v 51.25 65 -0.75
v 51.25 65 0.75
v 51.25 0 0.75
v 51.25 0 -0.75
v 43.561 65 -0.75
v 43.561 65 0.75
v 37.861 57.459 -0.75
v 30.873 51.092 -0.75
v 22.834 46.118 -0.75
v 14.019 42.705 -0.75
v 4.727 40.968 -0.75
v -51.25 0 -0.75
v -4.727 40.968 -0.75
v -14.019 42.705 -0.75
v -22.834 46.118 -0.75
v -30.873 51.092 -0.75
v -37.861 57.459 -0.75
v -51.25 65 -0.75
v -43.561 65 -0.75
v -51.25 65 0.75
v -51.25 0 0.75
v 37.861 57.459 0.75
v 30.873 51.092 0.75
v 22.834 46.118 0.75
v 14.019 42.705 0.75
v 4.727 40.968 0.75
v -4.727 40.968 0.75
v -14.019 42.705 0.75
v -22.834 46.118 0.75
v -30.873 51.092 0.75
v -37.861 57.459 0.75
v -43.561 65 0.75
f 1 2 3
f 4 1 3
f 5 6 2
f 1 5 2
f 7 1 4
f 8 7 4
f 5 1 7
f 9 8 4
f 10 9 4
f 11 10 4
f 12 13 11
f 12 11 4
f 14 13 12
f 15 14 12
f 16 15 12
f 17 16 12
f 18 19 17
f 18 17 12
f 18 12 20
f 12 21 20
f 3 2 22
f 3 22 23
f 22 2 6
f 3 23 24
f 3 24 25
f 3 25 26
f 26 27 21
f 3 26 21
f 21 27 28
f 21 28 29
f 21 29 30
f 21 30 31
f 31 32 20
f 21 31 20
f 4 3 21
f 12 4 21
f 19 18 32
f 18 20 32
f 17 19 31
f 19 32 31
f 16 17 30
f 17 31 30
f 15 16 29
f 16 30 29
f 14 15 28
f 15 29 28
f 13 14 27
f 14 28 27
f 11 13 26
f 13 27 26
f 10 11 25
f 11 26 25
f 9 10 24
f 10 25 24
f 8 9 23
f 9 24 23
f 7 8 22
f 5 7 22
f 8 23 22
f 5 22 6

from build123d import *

# Parameters (mm, degrees)
BOSS_EXTRUDE1_DEPTH = 0.75


with BuildPart() as part:
    # Sketch1 → Boss-Extrude1 (new, symmetric)
    with BuildSketch(Plane.XY):
        with BuildLine():
            Line((51.25, 0), (-51.25, 0))
            Line((-51.25, 0), (-51.25, 65))
            Line((-51.25, 65), (-43.56102042, 65))
            ThreePointArc((-43.56102042, 65), (0, 40.75), (43.56102042, 65))
            Line((43.56102042, 65), (51.25, 65))
            Line((51.25, 65), (51.25, 0))
        make_face()
    extrude(amount=BOSS_EXTRUDE1_DEPTH, both=True)


solid = part.part
